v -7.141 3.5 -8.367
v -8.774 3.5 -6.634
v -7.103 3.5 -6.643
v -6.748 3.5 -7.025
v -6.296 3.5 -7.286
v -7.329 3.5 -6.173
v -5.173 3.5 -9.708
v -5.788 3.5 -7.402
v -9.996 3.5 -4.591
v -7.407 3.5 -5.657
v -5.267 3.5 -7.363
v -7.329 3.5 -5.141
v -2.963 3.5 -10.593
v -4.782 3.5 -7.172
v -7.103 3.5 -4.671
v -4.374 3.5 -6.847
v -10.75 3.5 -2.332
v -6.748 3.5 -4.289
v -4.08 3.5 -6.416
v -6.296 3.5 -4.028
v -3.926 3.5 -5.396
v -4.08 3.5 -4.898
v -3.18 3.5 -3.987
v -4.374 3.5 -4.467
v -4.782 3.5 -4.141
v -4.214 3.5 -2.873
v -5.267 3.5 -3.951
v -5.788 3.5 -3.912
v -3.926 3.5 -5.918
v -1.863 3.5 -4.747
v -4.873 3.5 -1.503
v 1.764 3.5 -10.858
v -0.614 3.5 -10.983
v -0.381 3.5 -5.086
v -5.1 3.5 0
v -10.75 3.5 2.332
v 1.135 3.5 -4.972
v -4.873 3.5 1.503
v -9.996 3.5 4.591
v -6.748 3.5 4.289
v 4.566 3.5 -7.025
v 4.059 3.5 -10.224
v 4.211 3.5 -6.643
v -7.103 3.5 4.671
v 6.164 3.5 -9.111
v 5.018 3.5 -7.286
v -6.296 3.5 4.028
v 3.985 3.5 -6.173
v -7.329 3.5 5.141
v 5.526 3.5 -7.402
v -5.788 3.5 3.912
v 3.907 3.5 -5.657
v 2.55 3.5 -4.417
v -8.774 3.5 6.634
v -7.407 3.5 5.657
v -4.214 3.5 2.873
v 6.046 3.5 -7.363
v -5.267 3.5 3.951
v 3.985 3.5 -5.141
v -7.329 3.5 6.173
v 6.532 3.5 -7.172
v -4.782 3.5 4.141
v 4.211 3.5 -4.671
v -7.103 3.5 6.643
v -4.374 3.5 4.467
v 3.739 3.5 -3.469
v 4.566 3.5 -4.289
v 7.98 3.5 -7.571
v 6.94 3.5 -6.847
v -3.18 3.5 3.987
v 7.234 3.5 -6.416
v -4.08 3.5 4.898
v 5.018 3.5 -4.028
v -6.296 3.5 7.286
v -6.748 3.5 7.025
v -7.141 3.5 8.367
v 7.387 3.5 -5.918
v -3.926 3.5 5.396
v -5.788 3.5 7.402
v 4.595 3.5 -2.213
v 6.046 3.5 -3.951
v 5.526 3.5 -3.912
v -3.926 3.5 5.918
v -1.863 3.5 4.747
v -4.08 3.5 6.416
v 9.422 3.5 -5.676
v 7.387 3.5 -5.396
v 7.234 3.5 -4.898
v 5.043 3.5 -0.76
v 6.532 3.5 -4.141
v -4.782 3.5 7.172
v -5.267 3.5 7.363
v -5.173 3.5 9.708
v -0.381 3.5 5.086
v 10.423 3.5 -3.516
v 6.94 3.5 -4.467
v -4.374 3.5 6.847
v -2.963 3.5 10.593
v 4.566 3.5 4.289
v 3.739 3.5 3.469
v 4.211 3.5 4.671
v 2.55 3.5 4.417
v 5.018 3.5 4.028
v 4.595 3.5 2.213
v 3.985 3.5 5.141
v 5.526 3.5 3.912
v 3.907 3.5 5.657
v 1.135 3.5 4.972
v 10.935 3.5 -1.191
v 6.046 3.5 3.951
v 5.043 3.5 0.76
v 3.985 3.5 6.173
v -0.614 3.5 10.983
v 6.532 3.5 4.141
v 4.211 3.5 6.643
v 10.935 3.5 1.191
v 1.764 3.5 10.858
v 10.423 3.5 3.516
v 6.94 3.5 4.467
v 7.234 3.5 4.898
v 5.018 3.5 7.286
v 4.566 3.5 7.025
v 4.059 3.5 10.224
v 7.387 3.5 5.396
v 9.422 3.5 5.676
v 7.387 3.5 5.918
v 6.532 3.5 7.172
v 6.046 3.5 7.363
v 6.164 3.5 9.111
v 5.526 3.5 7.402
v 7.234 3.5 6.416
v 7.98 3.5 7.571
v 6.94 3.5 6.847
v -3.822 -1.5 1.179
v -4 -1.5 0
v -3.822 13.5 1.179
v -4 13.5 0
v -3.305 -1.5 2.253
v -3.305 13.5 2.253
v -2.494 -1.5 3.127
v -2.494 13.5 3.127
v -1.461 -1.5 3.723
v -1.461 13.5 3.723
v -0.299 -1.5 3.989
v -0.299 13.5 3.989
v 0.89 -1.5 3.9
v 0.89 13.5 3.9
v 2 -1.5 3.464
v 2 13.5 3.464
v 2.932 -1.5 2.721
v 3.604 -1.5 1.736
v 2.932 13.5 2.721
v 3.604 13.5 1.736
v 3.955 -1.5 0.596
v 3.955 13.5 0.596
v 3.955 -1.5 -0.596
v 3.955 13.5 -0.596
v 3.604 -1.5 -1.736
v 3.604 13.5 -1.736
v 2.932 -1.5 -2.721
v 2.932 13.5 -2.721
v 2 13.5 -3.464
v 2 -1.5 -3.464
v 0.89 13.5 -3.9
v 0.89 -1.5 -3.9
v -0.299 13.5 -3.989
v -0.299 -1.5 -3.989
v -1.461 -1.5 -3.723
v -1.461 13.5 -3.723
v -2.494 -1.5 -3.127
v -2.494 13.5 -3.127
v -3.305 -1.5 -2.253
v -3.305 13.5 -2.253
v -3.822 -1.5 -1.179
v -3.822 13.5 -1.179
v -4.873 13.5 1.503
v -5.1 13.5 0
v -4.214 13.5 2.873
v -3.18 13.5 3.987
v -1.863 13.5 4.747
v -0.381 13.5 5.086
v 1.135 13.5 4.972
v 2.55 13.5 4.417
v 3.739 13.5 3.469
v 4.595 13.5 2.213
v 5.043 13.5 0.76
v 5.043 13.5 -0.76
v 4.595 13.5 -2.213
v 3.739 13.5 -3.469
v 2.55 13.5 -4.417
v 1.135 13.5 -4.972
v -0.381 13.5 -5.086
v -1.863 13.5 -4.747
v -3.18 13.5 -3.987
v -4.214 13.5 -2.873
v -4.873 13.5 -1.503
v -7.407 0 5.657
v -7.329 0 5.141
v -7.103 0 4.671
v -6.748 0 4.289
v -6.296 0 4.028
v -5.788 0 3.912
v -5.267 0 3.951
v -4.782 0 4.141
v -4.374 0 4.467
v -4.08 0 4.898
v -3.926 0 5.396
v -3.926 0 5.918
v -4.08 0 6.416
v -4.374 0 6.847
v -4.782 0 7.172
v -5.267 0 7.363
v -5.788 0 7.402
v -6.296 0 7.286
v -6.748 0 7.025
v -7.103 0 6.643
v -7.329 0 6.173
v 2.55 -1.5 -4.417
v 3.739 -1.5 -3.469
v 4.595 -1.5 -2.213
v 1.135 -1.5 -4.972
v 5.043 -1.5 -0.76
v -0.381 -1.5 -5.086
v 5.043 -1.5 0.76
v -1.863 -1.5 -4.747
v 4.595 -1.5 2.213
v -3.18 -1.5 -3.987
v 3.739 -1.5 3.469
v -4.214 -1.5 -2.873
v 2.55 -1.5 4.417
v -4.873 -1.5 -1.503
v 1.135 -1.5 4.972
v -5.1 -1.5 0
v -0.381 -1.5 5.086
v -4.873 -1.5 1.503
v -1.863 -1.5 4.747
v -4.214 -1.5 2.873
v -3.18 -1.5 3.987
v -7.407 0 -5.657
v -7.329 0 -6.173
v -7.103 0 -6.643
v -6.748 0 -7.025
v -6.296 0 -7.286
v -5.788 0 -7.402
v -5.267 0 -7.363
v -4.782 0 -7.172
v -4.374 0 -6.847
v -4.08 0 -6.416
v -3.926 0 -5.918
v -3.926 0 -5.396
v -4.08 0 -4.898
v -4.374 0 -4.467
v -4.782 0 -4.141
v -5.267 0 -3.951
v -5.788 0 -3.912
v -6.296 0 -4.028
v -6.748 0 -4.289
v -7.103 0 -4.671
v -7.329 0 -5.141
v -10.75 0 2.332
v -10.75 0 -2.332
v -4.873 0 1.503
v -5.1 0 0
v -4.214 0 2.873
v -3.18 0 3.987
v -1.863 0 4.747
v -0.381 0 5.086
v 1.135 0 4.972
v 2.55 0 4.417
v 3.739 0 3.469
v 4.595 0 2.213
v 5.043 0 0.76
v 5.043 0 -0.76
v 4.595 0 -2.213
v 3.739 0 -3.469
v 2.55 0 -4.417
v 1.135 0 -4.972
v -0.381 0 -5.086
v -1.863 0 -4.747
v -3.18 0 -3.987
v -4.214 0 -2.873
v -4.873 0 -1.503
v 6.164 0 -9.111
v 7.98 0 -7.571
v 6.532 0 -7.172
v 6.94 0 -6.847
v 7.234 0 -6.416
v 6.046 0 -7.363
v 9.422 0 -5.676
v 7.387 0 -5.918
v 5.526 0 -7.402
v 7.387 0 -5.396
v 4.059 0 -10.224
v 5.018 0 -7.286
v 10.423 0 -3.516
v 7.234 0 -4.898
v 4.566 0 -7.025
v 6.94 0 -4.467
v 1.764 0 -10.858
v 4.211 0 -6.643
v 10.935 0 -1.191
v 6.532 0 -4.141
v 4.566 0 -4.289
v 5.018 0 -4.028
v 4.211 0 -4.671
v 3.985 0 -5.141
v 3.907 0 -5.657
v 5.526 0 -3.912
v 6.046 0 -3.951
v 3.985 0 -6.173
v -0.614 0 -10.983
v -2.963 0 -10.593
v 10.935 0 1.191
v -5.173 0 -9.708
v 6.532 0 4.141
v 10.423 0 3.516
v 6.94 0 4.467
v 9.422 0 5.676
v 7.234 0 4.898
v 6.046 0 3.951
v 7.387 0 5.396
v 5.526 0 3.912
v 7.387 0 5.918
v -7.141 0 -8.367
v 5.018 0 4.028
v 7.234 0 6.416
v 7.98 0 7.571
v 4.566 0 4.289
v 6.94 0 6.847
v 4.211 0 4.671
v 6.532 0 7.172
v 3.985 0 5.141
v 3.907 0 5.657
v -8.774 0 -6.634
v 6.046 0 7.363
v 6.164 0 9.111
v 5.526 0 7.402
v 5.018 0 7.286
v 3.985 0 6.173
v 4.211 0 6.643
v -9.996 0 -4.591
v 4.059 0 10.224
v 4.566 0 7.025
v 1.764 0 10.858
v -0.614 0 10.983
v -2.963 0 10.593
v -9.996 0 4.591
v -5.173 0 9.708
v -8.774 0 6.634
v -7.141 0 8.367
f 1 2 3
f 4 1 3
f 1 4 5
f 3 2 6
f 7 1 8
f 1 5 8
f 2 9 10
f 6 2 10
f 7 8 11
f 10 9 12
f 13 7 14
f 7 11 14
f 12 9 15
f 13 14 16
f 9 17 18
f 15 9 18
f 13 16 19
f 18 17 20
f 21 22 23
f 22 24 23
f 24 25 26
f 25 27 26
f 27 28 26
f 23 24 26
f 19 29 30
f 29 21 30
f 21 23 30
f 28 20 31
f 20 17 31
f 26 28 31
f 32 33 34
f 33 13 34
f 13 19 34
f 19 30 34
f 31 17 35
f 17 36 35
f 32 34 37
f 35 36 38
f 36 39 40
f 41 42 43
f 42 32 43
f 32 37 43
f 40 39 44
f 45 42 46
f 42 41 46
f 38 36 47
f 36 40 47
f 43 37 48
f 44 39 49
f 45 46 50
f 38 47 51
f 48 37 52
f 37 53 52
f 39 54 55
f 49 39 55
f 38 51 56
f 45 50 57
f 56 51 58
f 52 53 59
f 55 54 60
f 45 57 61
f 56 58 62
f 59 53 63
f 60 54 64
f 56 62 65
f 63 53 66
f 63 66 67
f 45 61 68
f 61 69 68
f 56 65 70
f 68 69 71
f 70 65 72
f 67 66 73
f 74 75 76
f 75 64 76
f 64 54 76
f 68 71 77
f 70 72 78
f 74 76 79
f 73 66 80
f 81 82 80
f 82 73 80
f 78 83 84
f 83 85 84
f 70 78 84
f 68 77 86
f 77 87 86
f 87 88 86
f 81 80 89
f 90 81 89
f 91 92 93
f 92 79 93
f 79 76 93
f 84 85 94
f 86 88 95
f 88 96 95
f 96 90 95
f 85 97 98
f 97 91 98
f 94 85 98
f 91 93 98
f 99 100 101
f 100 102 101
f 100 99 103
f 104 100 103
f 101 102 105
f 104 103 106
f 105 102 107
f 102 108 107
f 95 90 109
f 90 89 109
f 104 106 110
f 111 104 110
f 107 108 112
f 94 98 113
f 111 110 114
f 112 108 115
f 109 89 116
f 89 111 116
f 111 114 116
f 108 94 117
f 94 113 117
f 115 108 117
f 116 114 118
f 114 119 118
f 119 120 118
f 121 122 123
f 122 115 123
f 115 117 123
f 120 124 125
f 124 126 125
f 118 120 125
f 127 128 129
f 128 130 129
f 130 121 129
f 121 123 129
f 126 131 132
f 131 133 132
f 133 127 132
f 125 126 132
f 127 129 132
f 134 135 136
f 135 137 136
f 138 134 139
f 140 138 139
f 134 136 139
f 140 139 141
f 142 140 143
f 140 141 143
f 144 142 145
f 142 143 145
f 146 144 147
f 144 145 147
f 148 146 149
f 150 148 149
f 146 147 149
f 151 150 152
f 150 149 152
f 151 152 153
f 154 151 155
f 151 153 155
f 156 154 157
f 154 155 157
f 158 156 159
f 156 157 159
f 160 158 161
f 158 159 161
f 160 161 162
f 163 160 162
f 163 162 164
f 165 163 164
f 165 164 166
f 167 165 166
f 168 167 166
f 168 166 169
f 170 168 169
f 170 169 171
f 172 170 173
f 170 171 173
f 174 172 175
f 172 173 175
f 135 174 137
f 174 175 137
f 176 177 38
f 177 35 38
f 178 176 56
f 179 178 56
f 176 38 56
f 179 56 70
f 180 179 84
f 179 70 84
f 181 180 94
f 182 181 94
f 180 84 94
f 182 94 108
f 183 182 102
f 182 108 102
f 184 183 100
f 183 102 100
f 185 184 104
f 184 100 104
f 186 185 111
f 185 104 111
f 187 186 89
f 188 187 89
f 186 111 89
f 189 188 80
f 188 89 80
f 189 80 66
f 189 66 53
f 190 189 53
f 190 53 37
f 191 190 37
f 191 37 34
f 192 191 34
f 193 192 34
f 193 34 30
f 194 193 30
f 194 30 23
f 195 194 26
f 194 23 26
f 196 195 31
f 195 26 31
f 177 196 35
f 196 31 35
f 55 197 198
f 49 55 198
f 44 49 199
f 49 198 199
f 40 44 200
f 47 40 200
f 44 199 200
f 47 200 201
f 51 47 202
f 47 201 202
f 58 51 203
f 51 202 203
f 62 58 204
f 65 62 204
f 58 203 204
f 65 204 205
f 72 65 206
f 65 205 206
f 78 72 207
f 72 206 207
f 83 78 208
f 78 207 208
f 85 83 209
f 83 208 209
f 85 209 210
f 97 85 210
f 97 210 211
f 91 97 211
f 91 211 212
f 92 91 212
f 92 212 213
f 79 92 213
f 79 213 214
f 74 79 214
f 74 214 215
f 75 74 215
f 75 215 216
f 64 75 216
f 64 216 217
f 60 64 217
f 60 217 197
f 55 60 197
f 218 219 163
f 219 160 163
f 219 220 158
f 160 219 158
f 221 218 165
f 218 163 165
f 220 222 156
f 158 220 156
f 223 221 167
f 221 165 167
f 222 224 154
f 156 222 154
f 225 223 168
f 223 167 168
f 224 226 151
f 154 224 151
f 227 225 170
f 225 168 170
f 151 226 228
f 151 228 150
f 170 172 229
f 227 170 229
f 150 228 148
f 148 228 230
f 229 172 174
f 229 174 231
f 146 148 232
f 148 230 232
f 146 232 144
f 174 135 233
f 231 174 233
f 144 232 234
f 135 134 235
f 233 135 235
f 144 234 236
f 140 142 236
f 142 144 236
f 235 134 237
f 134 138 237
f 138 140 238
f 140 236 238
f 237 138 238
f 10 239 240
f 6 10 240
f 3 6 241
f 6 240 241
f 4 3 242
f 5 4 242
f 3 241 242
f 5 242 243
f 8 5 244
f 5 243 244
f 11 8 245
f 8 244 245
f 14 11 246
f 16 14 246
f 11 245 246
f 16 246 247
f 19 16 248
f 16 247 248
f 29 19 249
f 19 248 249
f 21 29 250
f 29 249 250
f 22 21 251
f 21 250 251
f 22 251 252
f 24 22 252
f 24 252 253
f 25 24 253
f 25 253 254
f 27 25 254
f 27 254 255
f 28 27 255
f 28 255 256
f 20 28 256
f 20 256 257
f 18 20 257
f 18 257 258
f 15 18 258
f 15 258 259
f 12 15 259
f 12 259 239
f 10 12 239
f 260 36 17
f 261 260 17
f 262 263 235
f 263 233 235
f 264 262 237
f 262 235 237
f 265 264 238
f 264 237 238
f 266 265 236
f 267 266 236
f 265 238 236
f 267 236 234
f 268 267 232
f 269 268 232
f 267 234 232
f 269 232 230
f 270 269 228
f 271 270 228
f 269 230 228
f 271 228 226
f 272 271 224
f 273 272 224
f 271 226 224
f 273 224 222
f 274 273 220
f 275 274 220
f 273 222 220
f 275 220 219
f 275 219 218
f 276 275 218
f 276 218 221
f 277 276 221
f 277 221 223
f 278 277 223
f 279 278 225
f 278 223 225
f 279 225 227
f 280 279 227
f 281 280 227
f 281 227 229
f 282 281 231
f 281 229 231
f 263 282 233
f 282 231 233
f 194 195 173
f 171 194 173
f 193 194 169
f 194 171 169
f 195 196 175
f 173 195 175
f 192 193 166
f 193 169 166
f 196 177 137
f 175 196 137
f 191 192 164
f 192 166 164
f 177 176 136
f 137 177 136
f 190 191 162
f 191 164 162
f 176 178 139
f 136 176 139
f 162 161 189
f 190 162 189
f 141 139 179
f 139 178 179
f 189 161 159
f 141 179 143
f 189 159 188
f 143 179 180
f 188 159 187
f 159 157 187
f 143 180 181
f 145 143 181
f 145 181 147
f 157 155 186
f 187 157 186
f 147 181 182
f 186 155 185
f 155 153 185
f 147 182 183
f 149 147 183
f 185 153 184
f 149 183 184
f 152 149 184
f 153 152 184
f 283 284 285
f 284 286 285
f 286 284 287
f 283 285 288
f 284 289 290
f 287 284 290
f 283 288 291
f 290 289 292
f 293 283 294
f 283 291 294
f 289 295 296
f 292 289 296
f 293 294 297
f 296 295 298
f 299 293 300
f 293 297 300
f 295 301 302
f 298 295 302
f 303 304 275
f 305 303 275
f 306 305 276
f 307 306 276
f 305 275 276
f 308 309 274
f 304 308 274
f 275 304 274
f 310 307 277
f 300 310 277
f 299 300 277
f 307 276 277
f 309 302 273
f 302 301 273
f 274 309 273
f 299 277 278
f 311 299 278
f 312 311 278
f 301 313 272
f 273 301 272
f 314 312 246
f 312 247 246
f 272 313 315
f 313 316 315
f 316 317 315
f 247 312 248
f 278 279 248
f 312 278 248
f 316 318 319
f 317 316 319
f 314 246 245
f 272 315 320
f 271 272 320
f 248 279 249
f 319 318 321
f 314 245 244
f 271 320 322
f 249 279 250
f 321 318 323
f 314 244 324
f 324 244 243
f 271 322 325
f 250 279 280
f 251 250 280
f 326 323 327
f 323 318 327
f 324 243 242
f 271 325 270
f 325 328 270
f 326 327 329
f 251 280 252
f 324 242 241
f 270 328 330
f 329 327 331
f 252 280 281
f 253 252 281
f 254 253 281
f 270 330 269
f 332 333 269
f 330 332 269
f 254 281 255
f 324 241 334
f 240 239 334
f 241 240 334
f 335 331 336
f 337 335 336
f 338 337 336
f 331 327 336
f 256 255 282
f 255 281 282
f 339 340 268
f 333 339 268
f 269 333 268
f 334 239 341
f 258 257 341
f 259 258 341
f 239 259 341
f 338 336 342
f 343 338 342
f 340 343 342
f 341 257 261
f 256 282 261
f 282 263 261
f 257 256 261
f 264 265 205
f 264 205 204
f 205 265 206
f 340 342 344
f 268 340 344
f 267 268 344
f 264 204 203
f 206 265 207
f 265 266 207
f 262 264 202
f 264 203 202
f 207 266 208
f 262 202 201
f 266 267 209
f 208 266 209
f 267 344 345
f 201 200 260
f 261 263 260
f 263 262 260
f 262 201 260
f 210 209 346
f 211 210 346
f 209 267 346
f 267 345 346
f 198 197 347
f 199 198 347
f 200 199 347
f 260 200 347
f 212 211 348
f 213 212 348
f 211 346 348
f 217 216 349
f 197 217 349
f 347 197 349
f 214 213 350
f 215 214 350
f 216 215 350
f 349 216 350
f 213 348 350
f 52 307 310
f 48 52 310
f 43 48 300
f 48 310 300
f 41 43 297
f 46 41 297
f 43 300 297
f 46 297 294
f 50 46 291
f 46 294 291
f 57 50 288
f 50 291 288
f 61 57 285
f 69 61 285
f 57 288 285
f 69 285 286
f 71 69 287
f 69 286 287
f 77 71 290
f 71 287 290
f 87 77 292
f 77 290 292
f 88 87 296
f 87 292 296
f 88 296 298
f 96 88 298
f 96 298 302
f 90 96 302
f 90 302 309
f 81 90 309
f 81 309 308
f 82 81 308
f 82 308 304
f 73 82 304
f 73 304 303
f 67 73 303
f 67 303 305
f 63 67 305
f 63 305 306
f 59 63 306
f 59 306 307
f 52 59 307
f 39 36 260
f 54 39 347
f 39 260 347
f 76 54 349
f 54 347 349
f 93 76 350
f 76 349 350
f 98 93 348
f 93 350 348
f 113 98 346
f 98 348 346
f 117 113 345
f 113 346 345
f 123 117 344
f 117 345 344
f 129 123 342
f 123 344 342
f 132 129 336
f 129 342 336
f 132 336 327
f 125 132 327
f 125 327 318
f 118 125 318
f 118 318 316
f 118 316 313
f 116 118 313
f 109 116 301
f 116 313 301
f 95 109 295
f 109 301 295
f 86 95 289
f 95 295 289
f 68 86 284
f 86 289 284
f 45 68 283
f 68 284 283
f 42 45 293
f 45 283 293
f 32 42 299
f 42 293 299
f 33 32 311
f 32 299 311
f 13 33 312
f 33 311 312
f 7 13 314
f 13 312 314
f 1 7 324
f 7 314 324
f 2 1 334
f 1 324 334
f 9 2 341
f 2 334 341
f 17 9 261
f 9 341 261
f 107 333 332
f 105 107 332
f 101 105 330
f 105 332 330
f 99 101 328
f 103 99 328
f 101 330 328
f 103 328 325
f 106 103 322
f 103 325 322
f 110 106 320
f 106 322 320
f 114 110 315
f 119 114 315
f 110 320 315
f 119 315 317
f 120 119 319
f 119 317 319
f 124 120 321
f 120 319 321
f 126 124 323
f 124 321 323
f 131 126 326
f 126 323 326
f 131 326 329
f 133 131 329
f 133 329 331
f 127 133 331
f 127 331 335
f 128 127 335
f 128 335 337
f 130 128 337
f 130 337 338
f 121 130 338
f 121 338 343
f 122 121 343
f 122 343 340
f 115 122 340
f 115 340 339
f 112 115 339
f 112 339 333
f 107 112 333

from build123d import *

# Parameters (mm, degrees)
F_3_5_3_5_DURCHMESSER_BOHRUNG1_D = 3.5
SKIZZE5_W                        = 0.5
SKIZZE5_H                        = 50
SCHNITT_LINEAR_AUSTRAGEN1_DEPTH  = 6


with BuildPart() as part:
    # Skizze1 → Rotation1 (revolve)
    with BuildSketch(Plane.XY):
        Polygon((-4, 0), (-4, 13.5), (-5.1, 13.5), (-5.1, 3.5), (-11, 3.5), (-11, 0), (-5.1, 0), (-5.1, -1.5), (-4, -1.5), align=None)
    revolve(axis=Axis((0, 0, 0), (0, 1, 0)))

    # Ø3.5 (3.5) Durchmesser Bohrung1 (through all)
    with Locations(Plane(origin=(0, 3.5, 0), x_dir=(1, 0, 0), z_dir=(0, 1, 0))):
        with Locations((5.656854249, 5.656854249), (-5.656854249, 5.656854249), (5.656854249, -5.656854249), (-5.656854249, -5.656854249)):
            Hole(F_3_5_3_5_DURCHMESSER_BOHRUNG1_D / 2)

    # Skizze5 → Schnitt-Linear austragen1 (cut, through all)
    with BuildSketch(Plane(origin=(0, 3.5, 0), x_dir=(1, 0, 0), z_dir=(0, 1, 0))):
        with Locations((-11, 0)):
            Rectangle(SKIZZE5_W, SKIZZE5_H)
    extrude(amount=-SCHNITT_LINEAR_AUSTRAGEN1_DEPTH, mode=Mode.SUBTRACT)


solid = part.part
